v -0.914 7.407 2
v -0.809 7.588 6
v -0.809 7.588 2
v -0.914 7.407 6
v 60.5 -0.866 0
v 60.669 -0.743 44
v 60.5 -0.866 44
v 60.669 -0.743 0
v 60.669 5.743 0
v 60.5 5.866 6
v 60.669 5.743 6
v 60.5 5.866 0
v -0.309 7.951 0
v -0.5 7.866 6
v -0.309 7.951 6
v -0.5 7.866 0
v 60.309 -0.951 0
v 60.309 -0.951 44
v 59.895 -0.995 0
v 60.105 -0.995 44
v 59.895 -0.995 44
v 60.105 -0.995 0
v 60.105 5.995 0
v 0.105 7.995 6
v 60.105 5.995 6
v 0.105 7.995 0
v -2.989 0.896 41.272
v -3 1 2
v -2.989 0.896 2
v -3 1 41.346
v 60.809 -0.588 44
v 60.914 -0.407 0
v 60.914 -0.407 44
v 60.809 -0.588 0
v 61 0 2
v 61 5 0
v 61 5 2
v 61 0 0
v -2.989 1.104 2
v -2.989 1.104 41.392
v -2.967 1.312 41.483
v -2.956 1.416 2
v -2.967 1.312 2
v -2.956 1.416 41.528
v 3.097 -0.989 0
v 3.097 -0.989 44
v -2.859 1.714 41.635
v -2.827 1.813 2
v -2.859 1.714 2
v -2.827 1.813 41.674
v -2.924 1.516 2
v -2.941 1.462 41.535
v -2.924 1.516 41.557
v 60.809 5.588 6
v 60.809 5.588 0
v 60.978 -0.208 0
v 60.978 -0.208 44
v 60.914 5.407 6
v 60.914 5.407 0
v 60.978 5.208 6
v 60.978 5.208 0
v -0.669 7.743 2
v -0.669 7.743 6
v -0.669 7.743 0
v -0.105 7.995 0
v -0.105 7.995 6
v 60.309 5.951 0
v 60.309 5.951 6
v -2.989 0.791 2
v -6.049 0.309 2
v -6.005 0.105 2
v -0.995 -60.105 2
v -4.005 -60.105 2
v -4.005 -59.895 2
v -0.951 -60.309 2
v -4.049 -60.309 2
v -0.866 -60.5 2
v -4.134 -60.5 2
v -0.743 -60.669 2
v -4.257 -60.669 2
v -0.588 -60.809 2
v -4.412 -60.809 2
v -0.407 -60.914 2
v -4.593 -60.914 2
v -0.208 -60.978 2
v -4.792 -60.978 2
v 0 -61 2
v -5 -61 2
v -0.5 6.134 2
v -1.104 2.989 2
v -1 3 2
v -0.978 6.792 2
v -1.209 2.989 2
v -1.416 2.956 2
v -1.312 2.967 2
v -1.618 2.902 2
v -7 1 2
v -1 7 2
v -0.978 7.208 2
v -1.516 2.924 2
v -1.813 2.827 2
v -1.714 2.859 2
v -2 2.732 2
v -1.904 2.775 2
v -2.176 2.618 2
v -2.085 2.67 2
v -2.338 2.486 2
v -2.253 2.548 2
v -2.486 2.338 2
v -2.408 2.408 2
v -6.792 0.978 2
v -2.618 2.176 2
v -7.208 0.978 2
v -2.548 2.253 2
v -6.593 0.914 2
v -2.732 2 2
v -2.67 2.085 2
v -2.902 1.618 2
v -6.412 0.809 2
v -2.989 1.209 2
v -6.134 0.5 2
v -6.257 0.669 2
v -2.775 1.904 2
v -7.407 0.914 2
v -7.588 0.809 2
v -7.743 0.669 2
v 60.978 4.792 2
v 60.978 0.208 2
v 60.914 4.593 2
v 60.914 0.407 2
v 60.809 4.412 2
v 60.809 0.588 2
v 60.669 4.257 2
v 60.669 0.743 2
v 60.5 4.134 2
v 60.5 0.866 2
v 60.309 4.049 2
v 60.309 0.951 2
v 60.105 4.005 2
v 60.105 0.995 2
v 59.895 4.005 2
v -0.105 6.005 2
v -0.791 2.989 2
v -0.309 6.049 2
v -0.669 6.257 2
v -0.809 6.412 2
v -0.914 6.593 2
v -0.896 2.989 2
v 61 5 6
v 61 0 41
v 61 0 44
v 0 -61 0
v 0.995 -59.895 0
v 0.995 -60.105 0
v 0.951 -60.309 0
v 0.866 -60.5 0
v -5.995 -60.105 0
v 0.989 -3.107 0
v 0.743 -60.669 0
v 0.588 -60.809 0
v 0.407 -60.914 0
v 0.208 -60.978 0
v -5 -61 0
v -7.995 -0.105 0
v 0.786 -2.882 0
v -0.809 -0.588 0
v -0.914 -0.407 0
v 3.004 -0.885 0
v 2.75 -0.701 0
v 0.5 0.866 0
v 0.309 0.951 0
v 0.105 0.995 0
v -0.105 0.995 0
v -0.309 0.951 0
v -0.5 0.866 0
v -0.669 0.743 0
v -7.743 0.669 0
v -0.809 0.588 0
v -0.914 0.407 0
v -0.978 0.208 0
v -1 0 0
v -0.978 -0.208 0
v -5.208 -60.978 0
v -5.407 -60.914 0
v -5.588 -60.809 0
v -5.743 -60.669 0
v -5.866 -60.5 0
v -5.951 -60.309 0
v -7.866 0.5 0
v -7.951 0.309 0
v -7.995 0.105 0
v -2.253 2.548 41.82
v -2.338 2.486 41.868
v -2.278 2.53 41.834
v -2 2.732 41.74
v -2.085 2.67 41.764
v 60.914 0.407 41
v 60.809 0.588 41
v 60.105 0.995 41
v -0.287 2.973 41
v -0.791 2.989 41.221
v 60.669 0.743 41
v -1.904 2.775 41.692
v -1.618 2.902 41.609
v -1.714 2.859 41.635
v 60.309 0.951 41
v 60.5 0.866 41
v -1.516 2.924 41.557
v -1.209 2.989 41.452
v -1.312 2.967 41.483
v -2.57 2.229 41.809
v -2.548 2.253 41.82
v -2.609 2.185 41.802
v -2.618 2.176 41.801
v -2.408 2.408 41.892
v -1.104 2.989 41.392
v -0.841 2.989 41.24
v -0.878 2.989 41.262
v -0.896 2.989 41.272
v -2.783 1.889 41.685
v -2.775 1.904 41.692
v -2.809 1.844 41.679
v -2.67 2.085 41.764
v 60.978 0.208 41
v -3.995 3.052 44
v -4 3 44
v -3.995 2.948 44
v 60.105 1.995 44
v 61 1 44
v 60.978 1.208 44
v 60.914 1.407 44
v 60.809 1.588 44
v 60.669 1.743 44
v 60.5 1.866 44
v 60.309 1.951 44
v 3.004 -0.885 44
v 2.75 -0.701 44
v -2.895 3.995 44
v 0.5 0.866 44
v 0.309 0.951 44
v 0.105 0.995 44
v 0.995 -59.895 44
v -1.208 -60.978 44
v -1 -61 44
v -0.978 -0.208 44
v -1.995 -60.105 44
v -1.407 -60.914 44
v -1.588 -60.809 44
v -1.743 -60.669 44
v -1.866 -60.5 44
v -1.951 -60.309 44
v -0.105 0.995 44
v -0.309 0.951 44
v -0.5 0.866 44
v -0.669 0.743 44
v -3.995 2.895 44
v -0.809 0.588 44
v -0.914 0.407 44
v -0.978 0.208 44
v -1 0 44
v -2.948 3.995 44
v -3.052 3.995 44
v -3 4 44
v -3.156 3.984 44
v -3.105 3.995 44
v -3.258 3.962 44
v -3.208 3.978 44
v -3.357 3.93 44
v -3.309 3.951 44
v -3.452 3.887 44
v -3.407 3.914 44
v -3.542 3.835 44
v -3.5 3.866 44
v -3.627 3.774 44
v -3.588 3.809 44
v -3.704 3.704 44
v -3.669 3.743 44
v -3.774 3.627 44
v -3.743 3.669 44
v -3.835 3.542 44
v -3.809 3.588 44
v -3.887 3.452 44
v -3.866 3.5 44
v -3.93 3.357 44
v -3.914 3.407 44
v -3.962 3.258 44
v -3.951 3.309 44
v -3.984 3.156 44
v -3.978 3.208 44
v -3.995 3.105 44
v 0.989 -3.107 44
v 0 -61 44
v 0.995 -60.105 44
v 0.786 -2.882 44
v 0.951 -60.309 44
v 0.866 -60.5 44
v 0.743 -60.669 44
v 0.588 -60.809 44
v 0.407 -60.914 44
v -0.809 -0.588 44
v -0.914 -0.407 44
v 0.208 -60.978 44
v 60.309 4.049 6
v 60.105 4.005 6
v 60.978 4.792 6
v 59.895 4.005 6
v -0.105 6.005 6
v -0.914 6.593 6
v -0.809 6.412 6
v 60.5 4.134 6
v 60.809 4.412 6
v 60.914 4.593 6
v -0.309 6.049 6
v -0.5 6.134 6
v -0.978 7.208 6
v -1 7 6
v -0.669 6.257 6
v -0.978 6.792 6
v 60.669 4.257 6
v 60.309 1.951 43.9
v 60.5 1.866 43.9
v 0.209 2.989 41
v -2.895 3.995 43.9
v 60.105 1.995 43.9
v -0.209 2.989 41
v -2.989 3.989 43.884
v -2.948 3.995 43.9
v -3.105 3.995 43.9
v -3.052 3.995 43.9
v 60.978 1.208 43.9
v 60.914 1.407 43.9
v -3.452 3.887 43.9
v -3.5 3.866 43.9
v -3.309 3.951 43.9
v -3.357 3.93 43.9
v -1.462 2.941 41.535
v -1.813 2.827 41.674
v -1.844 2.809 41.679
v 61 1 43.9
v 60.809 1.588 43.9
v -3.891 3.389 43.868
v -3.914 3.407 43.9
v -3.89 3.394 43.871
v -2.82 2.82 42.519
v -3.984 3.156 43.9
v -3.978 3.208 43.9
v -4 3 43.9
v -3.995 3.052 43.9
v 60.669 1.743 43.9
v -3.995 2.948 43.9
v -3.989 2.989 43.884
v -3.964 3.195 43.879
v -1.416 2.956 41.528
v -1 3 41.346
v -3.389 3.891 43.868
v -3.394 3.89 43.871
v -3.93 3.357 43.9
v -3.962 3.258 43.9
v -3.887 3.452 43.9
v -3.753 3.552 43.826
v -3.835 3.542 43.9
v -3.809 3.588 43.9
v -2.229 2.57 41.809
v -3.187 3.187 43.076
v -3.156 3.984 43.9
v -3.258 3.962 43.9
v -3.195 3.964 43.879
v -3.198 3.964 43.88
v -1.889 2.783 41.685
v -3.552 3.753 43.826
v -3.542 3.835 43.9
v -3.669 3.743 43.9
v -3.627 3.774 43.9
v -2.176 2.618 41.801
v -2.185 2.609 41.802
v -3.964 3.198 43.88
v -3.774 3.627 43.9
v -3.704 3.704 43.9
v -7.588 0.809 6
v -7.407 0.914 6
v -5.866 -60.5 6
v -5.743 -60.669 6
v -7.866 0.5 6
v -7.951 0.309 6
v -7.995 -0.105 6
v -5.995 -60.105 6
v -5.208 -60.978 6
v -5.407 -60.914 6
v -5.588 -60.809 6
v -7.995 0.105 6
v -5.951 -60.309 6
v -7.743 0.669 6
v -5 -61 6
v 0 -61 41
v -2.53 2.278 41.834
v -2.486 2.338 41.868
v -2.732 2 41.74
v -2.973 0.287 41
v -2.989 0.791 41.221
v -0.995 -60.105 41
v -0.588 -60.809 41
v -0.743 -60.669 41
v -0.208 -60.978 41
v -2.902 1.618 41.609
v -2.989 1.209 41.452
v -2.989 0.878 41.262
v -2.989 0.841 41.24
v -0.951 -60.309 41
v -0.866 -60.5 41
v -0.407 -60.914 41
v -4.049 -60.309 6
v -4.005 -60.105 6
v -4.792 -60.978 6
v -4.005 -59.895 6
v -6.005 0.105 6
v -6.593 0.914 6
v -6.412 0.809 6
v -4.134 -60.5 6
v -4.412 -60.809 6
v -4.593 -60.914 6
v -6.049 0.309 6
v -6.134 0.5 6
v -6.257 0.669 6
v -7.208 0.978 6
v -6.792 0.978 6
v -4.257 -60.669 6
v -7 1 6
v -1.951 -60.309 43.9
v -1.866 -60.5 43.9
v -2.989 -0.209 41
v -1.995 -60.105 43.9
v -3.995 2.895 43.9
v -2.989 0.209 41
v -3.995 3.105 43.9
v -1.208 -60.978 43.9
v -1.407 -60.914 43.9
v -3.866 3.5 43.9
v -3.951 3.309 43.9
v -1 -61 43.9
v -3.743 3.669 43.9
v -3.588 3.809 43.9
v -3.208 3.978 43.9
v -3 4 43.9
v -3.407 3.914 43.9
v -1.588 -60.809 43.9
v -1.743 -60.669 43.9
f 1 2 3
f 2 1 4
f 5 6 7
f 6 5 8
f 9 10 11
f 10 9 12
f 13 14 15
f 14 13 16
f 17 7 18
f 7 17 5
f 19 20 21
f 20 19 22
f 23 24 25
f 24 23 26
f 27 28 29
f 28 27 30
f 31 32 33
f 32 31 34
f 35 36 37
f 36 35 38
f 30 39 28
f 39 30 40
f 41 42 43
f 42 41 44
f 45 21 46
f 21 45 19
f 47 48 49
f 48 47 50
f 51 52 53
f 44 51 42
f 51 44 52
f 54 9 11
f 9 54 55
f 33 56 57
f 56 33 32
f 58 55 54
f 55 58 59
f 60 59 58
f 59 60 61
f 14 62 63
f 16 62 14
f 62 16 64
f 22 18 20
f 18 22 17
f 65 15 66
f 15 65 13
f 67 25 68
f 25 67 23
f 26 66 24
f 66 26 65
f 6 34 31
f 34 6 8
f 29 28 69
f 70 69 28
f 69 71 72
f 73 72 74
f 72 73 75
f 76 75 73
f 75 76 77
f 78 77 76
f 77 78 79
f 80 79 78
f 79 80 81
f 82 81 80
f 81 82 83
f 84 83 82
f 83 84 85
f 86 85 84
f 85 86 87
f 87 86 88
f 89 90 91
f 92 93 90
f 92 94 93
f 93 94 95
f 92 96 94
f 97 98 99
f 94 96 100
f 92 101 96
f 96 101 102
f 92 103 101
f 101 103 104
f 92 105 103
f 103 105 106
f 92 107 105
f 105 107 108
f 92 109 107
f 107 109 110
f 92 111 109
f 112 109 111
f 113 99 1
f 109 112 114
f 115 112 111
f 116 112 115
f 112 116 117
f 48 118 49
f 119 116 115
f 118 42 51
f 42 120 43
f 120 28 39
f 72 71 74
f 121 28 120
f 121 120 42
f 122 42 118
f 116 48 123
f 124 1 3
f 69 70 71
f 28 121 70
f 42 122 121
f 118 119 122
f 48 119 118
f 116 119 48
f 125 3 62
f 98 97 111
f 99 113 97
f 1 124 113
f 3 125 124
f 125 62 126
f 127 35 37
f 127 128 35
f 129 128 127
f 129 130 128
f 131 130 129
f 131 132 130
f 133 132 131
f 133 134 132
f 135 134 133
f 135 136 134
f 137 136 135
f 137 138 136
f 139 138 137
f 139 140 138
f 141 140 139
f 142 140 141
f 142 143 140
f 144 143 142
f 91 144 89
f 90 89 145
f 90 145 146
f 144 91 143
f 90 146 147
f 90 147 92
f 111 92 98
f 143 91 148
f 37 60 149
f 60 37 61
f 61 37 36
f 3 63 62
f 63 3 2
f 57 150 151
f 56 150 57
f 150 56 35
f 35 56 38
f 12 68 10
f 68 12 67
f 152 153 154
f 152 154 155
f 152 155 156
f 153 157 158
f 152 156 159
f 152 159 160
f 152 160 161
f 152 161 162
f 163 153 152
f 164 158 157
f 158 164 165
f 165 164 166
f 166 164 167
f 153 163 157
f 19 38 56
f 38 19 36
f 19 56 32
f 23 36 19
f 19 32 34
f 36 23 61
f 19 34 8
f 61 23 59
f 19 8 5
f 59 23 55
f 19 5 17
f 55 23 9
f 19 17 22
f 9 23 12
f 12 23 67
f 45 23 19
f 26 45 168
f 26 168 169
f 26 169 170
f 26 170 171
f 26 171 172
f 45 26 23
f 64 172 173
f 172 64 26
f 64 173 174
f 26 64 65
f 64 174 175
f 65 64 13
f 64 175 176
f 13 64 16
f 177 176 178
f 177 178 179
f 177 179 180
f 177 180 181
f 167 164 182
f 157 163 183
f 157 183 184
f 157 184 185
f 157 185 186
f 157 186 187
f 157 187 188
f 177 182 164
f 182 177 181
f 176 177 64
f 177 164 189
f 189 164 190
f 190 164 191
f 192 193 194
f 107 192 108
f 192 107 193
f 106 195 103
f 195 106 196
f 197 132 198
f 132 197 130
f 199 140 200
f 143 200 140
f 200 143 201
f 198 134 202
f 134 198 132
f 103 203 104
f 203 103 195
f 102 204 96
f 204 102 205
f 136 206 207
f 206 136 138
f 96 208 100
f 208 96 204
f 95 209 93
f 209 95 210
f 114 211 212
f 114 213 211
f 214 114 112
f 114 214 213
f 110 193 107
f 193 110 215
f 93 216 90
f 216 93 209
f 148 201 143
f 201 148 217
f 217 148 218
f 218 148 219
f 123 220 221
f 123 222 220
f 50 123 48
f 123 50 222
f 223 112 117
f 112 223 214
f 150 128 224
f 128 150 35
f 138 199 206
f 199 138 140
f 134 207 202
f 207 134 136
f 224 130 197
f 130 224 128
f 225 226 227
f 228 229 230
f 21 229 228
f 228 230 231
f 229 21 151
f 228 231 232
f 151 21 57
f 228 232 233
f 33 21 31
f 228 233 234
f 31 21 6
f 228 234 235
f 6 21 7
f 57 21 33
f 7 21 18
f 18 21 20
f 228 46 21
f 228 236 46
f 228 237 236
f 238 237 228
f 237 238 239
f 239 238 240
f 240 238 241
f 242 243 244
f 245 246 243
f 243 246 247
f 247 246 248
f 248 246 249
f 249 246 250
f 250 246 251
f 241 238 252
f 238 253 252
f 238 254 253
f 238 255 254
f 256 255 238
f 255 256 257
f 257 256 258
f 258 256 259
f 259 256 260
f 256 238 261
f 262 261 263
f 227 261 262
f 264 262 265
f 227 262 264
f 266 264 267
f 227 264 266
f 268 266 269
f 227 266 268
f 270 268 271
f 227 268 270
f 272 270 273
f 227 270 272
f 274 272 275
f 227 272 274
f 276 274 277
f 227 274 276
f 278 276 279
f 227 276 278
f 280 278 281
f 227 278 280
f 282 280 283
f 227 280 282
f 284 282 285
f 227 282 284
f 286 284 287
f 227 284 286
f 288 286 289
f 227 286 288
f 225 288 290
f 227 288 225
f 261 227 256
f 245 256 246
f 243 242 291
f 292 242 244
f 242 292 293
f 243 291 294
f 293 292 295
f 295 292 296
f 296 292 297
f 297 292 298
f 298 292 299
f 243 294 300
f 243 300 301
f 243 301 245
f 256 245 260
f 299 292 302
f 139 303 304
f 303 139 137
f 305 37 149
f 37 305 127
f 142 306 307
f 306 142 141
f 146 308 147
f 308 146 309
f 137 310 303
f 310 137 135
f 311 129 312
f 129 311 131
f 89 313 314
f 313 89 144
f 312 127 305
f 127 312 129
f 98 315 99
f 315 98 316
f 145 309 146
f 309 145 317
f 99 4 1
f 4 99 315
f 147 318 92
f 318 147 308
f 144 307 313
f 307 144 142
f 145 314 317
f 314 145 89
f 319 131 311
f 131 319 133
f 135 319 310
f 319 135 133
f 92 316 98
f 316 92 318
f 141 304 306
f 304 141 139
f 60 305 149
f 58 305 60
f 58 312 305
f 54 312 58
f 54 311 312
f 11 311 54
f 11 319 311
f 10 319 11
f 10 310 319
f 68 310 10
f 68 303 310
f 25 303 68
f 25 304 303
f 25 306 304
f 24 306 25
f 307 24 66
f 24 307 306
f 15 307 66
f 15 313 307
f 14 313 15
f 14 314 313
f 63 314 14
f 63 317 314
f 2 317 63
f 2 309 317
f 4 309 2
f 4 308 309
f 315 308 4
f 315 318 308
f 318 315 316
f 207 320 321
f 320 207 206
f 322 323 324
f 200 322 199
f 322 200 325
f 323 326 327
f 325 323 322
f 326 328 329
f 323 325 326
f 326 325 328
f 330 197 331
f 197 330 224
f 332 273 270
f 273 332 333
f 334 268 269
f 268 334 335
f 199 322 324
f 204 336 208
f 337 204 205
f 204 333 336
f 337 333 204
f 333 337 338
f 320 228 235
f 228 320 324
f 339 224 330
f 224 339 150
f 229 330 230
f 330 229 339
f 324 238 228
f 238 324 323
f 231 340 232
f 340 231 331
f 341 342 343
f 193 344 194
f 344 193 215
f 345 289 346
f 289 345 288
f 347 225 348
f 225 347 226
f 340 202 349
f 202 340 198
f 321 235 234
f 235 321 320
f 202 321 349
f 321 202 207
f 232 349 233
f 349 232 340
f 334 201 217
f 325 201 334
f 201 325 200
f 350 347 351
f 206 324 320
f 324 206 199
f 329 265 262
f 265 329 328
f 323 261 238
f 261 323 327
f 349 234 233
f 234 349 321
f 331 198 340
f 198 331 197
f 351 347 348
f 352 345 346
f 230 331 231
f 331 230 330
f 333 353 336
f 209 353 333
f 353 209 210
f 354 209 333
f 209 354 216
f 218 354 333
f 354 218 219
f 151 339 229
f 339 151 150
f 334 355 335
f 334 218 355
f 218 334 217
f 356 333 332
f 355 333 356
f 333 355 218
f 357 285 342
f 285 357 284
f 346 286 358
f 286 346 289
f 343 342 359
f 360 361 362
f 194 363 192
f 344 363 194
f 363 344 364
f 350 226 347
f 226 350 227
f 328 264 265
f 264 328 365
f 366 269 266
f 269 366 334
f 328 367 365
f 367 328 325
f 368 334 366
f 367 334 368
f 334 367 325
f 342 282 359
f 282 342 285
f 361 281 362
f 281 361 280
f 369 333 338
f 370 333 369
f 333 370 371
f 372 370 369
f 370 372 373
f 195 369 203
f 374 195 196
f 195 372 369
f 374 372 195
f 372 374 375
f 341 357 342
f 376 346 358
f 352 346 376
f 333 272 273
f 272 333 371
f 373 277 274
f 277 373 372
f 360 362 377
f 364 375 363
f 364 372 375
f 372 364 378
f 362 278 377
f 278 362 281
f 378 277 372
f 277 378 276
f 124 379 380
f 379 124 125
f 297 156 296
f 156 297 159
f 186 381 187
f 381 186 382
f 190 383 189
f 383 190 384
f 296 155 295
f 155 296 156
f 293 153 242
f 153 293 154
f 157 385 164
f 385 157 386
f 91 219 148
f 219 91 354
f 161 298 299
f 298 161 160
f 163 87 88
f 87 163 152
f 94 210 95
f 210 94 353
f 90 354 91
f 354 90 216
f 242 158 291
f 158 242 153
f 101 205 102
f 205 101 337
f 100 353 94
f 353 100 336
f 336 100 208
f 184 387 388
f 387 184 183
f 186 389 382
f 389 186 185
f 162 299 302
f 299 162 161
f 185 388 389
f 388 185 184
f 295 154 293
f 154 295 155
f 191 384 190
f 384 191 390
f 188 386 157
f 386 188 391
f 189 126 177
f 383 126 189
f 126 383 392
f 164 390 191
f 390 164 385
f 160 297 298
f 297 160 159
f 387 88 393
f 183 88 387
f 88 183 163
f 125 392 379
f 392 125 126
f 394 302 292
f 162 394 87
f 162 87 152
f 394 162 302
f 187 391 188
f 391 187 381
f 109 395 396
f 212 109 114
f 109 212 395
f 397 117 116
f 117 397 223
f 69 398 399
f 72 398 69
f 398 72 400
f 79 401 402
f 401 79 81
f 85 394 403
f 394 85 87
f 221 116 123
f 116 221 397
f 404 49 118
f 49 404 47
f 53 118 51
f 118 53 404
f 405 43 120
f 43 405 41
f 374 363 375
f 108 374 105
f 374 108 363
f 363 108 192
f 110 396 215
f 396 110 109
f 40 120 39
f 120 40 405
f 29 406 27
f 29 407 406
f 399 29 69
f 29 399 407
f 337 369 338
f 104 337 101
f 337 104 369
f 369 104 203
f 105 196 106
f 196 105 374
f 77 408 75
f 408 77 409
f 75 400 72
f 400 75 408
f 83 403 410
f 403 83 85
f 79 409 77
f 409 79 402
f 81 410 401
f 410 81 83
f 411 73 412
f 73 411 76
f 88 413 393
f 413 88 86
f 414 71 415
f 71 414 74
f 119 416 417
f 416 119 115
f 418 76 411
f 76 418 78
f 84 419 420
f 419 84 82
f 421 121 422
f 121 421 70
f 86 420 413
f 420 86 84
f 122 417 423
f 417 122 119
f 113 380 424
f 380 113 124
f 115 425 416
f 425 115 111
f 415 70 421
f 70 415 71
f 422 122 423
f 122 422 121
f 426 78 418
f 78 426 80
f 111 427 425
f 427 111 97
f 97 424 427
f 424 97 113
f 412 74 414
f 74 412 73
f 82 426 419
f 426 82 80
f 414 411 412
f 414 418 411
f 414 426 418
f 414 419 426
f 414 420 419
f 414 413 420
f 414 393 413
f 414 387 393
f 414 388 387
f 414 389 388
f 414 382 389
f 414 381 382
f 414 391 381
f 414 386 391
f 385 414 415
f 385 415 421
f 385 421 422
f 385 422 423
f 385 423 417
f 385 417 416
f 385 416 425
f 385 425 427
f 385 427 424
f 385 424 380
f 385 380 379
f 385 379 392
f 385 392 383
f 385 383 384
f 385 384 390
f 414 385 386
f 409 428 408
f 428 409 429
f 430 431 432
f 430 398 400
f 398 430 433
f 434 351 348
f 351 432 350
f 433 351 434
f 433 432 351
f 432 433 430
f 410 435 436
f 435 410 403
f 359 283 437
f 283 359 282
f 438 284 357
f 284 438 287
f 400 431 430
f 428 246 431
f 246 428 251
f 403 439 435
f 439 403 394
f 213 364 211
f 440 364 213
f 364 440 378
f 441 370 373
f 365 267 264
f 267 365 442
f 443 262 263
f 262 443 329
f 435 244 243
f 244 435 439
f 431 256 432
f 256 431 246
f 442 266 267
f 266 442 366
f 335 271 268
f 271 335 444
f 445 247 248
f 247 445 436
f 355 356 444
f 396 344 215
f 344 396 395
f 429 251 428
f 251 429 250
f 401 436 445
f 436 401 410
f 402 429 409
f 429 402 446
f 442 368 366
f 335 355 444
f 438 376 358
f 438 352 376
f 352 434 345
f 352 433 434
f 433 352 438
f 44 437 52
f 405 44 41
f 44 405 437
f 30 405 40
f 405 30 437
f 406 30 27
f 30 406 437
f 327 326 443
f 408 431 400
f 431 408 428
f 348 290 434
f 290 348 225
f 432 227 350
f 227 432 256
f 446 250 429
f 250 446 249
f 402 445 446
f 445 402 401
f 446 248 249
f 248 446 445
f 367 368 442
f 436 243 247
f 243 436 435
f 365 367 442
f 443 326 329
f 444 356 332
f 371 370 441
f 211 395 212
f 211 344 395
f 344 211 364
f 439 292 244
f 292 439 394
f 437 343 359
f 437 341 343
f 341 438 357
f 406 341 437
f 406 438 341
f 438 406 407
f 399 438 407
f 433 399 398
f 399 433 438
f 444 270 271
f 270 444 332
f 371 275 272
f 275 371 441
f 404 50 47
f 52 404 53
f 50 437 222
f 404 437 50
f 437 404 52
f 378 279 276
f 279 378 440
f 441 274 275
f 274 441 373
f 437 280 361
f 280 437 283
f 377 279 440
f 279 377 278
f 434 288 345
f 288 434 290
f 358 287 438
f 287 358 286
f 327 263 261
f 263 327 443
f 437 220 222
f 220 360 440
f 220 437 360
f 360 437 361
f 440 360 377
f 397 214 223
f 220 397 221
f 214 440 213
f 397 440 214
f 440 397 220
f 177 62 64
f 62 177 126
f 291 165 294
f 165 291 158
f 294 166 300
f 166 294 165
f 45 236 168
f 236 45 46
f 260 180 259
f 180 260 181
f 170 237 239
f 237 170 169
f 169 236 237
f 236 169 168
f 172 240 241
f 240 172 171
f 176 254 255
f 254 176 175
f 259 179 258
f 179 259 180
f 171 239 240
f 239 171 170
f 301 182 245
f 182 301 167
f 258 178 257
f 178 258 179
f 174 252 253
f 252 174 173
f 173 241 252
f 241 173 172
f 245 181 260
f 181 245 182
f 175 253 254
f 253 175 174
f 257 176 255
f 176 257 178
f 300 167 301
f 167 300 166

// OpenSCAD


// How wide is the strap and any extra play you want added
StrapWidth = 40;
// Space for the gap for the hook to hold the clamp corner on the strap
StrapThickness = 3;

// Minimum Thickness of the clamp corner body. It will be twice as thick in the corner
ClampThickness = 2;
// How long to make the clamp from corner to end
ClampLength = 60 ;

// Angle too be clamped
ClampAngle = 90;



difference()
{
	CornerBracket();
	// Make a spot for the glue to sqeeze out
	hull()
	{	
		cylinder(h = StrapWidth + ClampThickness * 2, r=ClampThickness * .5 , $fs=0.01);	
		translate([ClampThickness  , -ClampThickness   , 0]) cylinder(h = StrapWidth + ClampThickness * 2, r=ClampThickness * .75 , $fs=0.01);	
	}


}

module CornerBracket()
{
	frame();
	rotate(a = ClampAngle, v = [ 0, 0, -1]) mirror([0, 1, 0]) frame();
	
	hull ()
	{
		OutsideCorner();
		rotate(a = ClampAngle, v = [ 0, 0, -1]) mirror([0, 1, 0]) OutsideCorner();
	}
}		

module frame ()
{
 	//Base
     hull(){
		translate(v = [ClampLength, 0, 0]) cylinder(h = ClampThickness, r=ClampThickness * .5, $fs=0.01);
		translate(v = [-ClampThickness * .5, ClampThickness * .5, 0]) cylinder(h = ClampThickness, r=ClampThickness , $fs=0.01);	
		translate(v = [0,  (ClampThickness  * 2 + StrapThickness)  , 0])  cylinder(h = ClampThickness , r=ClampThickness * .5 , $fs=0.01);
		translate(v = [ClampLength,  (ClampThickness + StrapThickness) , 0])  cylinder(h = ClampThickness , r=ClampThickness * .5, $fs=0.01);
	}

       //Sides
	hull(){
		// Narrow side
		translate(v = [ClampLength, 0, 0]) cylinder(h = StrapWidth + ClampThickness * 2, r=ClampThickness * .5, $fs=0.01);
		// Wide side
		translate(v = [-ClampThickness * .5, ClampThickness * .5, 0]) cylinder(h = StrapWidth + ClampThickness * 2, r=ClampThickness , $fs=0.01);	
	}
	//Short Side
	hull(){
		translate(v = [0,  (ClampThickness  * 2 + StrapThickness)  , 0])  cylinder(h = StrapWidth * .1 + ClampThickness , r=ClampThickness  * .5, $fs=0.01);
		translate(v = [ClampLength,  (ClampThickness + StrapThickness) , 0])  cylinder(h = StrapWidth * .1 + ClampThickness , r=ClampThickness * .5, $fs=0.01);
	}
	//Upper step Side
	hull(){
		// inline part
		translate(v = [0,  ClampThickness *.5  , StrapWidth + ClampThickness * 2 - StrapThickness])  cylinder(h = StrapThickness , r=ClampThickness , $fs=0.01);
		translate(v = [ClampLength,  0  , StrapWidth + ClampThickness * 2 - StrapThickness])  cylinder(h = StrapThickness , r=ClampThickness * .5, $fs=0.01);
		// Outside step part
		translate(v = [-ClampThickness * 1.5,  ClampThickness * 1.5 , StrapWidth + ClampThickness * 2 - .1])  cylinder(h = .1 , r=ClampThickness  * .5, $fs=0.01);
		translate(v = [ClampLength,  ClampThickness *.5  , StrapWidth + ClampThickness * 2 - .1])  cylinder(h = .1 , r=ClampThickness * .5, $fs=0.01);
	}
}

module OutsideCorner()
{
	cylinder(h = ClampThickness, r=ClampThickness * .5 , $fs=0.01);	
	translate(v = [0,  (ClampThickness  * 2 + StrapThickness)  , 0])  cylinder(h = ClampThickness , r=ClampThickness * .5 , $fs=0.01);
}
